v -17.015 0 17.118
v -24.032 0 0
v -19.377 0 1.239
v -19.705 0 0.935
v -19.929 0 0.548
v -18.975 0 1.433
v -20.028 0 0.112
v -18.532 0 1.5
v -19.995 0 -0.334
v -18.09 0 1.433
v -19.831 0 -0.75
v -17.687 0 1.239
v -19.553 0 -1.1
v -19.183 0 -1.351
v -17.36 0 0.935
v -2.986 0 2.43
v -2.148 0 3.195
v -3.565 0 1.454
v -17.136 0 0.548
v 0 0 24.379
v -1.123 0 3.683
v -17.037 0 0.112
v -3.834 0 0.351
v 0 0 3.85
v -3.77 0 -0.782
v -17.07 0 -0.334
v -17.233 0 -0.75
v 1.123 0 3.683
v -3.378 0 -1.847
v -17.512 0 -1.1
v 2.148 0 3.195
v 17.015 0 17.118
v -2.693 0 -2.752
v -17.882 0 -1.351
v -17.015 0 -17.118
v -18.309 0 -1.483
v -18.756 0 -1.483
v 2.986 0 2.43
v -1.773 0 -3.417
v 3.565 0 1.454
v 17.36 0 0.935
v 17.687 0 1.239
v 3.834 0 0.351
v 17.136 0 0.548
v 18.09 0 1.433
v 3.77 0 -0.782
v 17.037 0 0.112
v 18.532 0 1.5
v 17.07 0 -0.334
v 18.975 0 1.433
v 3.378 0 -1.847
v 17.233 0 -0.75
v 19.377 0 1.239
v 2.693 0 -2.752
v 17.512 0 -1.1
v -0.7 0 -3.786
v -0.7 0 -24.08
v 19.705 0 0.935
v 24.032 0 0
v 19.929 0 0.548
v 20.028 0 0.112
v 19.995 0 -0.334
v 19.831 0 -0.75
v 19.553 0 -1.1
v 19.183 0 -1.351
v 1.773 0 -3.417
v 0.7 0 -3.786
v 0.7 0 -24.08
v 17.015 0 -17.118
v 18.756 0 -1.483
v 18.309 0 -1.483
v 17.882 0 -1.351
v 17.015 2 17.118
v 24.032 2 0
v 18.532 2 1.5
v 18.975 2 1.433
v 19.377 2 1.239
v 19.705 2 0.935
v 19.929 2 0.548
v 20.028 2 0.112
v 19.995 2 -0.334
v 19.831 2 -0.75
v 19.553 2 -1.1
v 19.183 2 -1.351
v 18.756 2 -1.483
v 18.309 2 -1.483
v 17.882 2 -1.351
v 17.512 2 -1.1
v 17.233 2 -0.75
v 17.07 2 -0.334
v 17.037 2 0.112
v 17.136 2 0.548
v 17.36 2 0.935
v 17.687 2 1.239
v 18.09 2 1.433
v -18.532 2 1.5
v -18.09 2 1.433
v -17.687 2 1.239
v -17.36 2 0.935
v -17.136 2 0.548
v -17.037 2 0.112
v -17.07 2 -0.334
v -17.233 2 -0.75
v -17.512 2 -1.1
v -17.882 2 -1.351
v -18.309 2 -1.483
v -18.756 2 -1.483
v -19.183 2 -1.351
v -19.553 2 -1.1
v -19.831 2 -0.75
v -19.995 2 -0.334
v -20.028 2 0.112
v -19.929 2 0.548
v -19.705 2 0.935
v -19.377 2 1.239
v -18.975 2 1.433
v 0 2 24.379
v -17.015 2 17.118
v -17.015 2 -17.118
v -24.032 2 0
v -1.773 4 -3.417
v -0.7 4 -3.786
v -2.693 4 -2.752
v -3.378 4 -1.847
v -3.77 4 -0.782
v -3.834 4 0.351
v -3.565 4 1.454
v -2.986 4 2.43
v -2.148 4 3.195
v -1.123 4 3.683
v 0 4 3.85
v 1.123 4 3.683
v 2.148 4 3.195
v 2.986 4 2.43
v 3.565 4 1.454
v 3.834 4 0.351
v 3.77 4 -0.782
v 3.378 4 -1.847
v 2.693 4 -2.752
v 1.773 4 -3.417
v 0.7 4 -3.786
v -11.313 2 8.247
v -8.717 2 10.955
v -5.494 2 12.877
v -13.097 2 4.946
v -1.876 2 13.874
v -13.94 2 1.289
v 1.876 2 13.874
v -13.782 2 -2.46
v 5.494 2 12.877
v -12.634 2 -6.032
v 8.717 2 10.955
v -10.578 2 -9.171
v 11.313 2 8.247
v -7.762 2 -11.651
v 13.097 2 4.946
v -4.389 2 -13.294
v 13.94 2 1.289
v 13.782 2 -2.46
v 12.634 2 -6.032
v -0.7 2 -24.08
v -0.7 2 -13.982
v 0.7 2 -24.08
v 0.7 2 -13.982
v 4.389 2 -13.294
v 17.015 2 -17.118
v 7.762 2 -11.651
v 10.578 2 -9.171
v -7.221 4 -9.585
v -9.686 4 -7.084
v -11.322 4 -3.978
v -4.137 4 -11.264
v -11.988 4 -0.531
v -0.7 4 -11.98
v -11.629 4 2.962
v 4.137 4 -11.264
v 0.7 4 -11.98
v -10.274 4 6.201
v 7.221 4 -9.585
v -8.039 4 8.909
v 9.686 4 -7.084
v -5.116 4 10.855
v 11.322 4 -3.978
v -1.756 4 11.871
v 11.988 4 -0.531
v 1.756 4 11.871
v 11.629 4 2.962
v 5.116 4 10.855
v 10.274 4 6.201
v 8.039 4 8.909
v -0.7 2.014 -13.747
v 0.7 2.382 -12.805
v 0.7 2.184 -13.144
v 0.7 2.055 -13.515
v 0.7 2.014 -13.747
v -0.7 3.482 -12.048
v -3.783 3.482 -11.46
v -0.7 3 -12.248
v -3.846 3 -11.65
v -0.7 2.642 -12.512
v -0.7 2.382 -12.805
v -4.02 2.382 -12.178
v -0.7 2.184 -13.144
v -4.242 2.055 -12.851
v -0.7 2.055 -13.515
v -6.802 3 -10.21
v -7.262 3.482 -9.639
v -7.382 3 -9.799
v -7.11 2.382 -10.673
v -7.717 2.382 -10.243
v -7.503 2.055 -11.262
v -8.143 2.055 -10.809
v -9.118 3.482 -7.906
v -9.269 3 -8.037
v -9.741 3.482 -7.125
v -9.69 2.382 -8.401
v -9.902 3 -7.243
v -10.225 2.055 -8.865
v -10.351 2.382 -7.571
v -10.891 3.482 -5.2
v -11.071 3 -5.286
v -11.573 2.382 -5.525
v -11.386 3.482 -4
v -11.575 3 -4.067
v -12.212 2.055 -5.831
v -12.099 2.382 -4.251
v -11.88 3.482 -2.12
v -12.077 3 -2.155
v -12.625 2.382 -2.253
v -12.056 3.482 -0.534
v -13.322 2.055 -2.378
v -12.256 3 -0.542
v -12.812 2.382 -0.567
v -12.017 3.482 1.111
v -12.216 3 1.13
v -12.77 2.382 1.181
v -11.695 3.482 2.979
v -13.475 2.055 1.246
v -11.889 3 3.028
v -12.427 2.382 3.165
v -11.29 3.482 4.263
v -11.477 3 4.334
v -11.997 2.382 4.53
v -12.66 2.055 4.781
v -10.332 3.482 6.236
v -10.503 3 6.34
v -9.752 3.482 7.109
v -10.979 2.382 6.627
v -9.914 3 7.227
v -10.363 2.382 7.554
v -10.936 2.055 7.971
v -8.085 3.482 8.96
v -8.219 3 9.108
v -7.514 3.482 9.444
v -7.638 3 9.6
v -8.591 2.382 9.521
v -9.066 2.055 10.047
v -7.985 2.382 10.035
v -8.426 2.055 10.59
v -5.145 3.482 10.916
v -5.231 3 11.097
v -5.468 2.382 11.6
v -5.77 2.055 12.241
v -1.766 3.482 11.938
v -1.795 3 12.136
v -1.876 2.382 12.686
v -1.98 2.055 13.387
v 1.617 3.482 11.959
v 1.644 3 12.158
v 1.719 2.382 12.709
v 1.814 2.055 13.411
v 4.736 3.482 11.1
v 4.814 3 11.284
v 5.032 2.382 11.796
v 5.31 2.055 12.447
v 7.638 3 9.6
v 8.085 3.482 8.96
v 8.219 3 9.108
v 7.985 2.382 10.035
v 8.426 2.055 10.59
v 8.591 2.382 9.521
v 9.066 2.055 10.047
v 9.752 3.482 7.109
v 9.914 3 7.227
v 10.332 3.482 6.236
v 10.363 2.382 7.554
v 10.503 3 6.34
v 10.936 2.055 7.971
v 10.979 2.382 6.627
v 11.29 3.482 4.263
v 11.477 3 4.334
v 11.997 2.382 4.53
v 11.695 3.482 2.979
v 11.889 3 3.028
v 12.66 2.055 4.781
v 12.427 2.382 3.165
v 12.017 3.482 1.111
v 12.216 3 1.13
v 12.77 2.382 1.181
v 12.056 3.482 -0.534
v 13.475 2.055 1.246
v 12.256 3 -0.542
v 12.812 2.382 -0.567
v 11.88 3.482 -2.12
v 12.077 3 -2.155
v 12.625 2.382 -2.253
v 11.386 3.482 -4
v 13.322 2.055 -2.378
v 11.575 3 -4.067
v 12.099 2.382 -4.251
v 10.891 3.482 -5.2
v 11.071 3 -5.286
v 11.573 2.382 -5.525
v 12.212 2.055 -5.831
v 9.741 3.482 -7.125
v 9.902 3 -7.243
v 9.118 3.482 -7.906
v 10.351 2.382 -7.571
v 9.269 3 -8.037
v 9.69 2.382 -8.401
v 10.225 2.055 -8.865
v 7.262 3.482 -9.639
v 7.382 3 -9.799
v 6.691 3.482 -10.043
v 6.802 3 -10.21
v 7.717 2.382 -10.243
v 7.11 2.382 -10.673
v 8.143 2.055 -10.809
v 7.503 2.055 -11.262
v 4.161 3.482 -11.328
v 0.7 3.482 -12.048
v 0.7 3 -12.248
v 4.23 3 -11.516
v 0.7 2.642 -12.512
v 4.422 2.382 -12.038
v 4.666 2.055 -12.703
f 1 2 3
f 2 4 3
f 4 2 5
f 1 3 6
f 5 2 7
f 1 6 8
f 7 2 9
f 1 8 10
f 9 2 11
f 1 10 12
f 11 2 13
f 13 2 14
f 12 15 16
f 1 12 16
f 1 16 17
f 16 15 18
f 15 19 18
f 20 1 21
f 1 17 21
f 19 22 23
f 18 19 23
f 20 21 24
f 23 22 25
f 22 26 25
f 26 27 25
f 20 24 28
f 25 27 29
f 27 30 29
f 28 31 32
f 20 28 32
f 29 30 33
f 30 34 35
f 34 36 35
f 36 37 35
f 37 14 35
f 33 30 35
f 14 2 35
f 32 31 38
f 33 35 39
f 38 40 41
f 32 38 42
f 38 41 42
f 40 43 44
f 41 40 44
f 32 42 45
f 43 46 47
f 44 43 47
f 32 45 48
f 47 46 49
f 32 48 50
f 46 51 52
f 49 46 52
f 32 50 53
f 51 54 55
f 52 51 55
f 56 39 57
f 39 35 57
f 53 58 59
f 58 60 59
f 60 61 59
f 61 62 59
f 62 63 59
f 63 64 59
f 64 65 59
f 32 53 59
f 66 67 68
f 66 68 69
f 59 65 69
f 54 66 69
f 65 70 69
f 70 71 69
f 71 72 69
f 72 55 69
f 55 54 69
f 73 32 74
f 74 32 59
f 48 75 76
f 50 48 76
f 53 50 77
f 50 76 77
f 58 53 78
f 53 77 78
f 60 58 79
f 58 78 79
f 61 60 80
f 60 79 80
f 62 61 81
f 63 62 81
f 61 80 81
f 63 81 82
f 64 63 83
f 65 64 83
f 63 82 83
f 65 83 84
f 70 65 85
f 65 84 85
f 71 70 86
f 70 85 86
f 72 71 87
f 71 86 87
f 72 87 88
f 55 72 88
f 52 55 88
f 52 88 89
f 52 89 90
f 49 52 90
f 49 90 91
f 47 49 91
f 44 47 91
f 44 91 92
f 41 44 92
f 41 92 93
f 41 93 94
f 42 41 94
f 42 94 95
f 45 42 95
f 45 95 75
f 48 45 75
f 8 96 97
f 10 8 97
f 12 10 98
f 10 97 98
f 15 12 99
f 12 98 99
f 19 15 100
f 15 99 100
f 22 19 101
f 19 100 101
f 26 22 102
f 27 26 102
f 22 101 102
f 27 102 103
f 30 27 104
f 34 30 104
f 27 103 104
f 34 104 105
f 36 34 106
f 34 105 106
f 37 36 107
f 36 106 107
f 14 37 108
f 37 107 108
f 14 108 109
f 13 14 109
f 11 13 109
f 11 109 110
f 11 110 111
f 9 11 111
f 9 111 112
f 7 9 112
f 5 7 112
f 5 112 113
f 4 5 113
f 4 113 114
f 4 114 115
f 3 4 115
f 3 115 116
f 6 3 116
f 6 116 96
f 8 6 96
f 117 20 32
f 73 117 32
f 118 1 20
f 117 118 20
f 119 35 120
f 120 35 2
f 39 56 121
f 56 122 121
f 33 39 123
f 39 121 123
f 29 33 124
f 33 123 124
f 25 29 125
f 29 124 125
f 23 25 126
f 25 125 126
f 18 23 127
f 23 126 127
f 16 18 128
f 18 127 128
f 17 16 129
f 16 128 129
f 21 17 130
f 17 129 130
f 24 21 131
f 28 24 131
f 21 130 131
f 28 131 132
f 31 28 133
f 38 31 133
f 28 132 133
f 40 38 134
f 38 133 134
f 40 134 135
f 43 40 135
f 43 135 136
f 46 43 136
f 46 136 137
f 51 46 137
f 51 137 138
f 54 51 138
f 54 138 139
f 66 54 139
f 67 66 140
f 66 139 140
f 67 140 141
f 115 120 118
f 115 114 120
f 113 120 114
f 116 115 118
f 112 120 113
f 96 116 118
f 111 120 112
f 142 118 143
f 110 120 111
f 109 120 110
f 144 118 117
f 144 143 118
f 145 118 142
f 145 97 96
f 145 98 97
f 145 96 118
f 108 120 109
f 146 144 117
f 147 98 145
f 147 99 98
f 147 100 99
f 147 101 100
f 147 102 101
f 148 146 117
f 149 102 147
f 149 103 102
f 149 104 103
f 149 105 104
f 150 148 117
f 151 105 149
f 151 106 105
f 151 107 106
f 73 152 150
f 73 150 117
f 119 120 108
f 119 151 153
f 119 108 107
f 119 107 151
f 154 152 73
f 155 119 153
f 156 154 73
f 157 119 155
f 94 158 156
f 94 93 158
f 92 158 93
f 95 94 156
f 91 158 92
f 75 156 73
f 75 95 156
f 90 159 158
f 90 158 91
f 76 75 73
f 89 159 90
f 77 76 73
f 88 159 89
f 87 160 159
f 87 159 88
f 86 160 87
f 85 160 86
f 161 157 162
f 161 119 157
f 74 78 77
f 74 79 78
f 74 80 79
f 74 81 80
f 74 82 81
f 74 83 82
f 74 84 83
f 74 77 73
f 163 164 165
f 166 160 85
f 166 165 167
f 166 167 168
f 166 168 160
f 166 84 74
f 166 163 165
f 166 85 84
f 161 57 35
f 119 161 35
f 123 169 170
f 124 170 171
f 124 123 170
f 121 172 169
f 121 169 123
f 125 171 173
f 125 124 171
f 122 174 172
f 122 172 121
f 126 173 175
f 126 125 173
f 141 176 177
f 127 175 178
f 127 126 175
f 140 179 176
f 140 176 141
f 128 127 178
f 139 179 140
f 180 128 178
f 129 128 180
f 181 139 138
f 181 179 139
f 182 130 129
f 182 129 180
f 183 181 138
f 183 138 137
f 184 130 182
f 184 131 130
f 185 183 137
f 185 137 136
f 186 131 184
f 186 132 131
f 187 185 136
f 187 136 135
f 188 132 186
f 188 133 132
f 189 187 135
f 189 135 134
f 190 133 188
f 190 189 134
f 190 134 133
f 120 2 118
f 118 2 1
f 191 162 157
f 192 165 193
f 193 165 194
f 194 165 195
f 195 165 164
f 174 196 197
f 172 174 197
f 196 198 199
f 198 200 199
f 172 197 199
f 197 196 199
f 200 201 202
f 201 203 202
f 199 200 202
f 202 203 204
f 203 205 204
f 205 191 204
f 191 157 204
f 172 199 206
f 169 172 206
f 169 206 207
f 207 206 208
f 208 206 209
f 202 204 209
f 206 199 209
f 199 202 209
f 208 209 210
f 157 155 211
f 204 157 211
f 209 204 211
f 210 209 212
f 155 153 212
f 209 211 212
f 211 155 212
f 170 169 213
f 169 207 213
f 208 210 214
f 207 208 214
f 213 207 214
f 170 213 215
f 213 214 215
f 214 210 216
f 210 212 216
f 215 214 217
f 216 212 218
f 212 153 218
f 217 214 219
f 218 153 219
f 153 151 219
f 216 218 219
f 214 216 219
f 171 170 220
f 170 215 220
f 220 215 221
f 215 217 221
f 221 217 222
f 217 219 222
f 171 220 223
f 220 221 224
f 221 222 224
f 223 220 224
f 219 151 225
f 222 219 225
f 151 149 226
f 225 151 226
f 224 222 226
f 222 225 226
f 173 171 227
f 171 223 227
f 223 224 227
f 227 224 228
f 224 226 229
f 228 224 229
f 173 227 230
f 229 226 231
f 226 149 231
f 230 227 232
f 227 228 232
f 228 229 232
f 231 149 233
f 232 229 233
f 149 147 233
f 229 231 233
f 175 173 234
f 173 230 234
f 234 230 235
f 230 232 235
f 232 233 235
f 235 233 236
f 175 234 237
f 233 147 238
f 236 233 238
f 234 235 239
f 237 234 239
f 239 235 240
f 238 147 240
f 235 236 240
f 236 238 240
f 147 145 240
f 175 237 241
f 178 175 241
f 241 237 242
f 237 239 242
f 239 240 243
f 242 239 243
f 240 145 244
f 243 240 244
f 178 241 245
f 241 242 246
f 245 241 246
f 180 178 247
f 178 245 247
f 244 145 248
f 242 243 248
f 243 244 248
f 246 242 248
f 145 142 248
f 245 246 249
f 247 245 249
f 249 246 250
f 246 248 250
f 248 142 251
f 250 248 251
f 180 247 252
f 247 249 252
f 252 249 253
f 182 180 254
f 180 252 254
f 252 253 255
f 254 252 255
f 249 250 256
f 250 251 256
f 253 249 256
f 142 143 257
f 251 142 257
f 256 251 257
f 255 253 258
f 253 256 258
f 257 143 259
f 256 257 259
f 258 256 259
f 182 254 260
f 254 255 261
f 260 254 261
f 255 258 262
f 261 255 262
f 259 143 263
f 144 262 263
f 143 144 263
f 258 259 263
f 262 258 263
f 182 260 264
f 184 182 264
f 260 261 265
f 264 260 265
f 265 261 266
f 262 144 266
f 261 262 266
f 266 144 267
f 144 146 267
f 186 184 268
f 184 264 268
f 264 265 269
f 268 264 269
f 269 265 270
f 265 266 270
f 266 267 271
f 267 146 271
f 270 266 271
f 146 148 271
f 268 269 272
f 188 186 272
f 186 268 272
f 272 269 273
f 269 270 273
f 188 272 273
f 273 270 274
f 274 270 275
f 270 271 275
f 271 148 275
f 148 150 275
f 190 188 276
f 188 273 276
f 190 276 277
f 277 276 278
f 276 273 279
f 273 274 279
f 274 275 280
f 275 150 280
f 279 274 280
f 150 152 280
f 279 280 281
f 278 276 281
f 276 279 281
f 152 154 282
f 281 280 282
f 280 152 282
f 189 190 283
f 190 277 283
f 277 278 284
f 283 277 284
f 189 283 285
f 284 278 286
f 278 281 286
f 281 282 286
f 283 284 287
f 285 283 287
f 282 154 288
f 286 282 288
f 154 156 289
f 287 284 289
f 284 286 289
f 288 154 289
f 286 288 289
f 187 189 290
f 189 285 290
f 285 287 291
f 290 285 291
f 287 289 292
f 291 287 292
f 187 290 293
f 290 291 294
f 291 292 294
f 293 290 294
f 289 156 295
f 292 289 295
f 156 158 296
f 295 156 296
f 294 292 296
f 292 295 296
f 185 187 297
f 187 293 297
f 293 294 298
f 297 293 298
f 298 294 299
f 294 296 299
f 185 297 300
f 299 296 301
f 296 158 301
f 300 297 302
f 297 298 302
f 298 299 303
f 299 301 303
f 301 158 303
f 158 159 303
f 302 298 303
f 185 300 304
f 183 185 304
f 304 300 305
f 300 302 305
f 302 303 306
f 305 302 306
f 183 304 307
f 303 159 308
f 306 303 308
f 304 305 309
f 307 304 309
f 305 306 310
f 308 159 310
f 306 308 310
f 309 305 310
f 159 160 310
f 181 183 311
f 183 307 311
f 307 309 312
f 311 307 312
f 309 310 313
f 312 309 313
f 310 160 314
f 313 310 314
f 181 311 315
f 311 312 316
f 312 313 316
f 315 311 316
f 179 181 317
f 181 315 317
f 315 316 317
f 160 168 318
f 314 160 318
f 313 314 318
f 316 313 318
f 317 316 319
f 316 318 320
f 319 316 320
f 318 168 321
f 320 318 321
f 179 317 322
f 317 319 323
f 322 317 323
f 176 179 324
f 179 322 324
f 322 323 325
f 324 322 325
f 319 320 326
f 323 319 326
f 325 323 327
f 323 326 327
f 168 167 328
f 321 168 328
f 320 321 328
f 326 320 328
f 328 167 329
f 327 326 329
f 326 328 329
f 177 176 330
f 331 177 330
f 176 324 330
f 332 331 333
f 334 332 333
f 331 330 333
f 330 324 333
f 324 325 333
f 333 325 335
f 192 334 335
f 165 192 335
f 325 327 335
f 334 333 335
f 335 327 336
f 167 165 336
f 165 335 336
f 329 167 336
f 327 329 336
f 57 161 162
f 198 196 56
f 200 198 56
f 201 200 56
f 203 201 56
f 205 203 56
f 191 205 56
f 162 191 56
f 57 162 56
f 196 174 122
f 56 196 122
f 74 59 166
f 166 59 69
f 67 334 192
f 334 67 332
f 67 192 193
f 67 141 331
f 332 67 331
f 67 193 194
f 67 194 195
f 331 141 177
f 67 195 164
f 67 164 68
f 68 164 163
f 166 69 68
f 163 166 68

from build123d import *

# Parameters (mm, degrees)
BOSS_EXTRUDE1_DEPTH = 2
SKETCH2_R           = 12
BOSS_EXTRUDE2_DEPTH = 2
SKETCH3_R           = 3.85
CUT_EXTRUDE1_DEPTH  = 25
CUT_EXTRUDE2_DEPTH  = 35.465615693
FILLET2_R           = 2
SKETCH6_R           = 1.5
CUT_EXTRUDE3_DEPTH  = 35.29108726


with BuildPart() as part:
    # Sketch1 → Boss-Extrude1 (new body)
    with BuildSketch(Plane(origin=(0, 0, 0), x_dir=(1, 0, 0), z_dir=(0, 1, 0))):
        Polygon((0, 24.378752643), (-17.015462305, 17.117620324), (-24.03237576, 0), (-17.015462305, -17.117620324), (0, -24.378752643), (17.015462305, -17.117620324), (24.03237576, 0), (17.015462305, 17.117620324), align=None)
    extrude(amount=BOSS_EXTRUDE1_DEPTH)

    # Sketch2 → Boss-Extrude2 (add)
    with BuildSketch(Plane(origin=(0, 2, 0), x_dir=(1, 0, 0), z_dir=(0, 1, 0))):
        with Locations(Location((0, 0, 0), (0, 0, 270))):
            Circle(SKETCH2_R)
    extrude(amount=BOSS_EXTRUDE2_DEPTH)

    # Sketch3 → Cut-Extrude1 (cut)
    with BuildSketch(Plane(origin=(0, 4, 0), x_dir=(1, 0, 0), z_dir=(0, 1, 0))):
        with Locations(Location((0, 0, 0), (0, 0, 270))):
            Circle(SKETCH3_R)
    extrude(amount=-CUT_EXTRUDE1_DEPTH, mode=Mode.SUBTRACT)

    # Sketch4 → Cut-Extrude2 (cut, through all)
    with BuildSketch(Plane(origin=(0, 4, 0), x_dir=(1, 0, 0), z_dir=(0, 1, 0))):
        Polygon((0.7, 0), (0.7, 24.080036538), (0, 24.378752643), (-0.7, 24.080036538), (-0.7, 0), align=None)
    extrude(amount=-CUT_EXTRUDE2_DEPTH, mode=Mode.SUBTRACT)

    # Fillet2
    fillet2_edges = [part.edges().sort_by_distance(p)[0] for p in [
        (-11.994890396, 2, 0.350149094),
    ]]
    fillet(fillet2_edges, radius=FILLET2_R - 0.0001)  # a hair under: the kernel refuses the full size

    # Sketch6 → Cut-Extrude3 (cut, through all)
    with BuildSketch(Plane(origin=(0, 2, 0), x_dir=(1, 0, 0), z_dir=(0, 1, 0))):
        with Locations(Location((-18.53237576, 0, 0), (0, 0, 270))):
            Circle(SKETCH6_R)
        with Locations(Location((18.53237576, 0, 0), (0, 0, 270))):
            Circle(SKETCH6_R)
    extrude(amount=-CUT_EXTRUDE3_DEPTH, mode=Mode.SUBTRACT)


solid = part.part
